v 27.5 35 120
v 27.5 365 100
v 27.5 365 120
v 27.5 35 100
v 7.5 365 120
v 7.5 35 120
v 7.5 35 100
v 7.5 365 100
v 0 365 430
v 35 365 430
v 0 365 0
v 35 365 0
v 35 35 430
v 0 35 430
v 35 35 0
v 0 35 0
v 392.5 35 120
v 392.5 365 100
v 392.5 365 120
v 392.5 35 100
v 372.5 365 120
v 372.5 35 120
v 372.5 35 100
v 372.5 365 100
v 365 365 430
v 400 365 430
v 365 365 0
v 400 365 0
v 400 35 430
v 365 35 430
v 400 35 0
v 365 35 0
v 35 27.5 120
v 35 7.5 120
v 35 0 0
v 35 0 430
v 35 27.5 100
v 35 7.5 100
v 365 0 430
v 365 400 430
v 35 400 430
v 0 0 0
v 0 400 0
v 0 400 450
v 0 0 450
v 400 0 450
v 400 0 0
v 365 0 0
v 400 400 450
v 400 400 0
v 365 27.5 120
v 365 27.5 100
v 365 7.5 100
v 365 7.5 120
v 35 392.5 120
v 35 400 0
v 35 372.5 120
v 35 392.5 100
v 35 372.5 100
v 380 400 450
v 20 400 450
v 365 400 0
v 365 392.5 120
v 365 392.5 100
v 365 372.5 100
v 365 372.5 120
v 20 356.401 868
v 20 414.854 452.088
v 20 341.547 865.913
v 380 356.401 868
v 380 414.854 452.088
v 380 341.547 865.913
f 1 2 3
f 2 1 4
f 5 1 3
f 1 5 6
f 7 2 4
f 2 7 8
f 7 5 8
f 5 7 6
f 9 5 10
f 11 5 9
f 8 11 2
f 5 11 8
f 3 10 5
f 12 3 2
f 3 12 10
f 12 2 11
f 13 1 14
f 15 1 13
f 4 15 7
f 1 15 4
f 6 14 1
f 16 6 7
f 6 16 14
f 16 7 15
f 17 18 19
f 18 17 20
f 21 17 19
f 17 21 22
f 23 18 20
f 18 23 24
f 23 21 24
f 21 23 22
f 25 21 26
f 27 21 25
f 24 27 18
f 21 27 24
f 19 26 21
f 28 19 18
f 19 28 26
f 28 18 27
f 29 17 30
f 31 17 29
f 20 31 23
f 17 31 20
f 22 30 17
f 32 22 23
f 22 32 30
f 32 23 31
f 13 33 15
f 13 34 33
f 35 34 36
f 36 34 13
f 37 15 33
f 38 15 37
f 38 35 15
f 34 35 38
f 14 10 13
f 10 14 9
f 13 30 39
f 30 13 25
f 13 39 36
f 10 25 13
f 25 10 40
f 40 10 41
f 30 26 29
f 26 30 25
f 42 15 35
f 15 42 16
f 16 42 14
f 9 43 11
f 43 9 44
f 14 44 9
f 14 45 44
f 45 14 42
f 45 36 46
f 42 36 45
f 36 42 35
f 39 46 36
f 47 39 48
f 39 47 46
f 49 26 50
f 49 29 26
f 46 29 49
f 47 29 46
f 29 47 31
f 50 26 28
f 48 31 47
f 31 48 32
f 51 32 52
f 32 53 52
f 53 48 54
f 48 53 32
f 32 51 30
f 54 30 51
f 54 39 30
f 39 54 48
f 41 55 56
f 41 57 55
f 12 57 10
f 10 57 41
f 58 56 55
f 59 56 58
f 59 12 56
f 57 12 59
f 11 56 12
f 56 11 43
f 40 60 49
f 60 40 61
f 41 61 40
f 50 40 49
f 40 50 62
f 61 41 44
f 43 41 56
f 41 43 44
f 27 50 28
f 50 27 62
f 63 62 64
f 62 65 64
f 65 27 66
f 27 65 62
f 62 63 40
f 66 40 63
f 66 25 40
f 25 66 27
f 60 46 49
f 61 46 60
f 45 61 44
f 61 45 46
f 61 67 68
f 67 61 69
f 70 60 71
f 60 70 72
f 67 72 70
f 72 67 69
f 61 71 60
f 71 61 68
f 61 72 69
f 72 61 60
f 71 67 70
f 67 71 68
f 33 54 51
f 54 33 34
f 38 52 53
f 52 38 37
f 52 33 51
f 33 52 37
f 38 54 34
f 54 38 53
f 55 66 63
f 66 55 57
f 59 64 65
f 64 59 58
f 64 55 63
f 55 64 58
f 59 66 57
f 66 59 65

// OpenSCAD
// Basic IKEA-style Chair in OpenSCAD
// All dimensions are in millimeters.

// --- Chair Configuration ---
seat_w = 400; // Width of the seat (X-axis)
seat_d = 400; // Depth of the seat (Y-axis)
seat_top_h = 450; // Height from floor to top of seat surface

backrest_h_above_seat = 420; // Height of backrest extending above the seat
backrest_w_ratio = 0.90; // Width of backrest relative to seat width
backrest_tilt_angle = 8; // Tilt angle of the backrest from vertical (positive tilts back)

// --- Material Thicknesses & Component Sizes ---
seat_thickness = 20;
backrest_thickness = 15;
leg_side = 35; // Square legs, side length
strut_side = 20; // Square struts, side length

// --- Derived Dimensions ---
actual_leg_h = seat_top_h - seat_thickness;
actual_backrest_w = seat_w * backrest_w_ratio;

// --- Strut Placement ---
// Z height of the *bottom* surface of the struts from the floor
strut_level_z = 100; 

$fn = 50; // Smoothness for any curves (though not explicitly used for cubes)

// --- Modules for Chair Parts ---

module leg() {
    cube([leg_side, leg_side, actual_leg_h]);
}

module seat_panel() {
    cube([seat_w, seat_d, seat_thickness]);
}

module backrest_panel() {
    // Centered for easier rotation placement later
    // Dimensions: X=width, Y=thickness, Z=height
    cube([actual_backrest_w, backrest_thickness, backrest_h_above_seat], center=true);
}

module strut_along_x(length) {
    // Strut oriented along the X-axis
    cube([length, strut_side, strut_side]);
}

module strut_along_y(length) {
    // Strut oriented along the Y-axis
    cube([strut_side, length, strut_side]);
}

// --- Assemble the Chair ---
// The chair's front-left-bottom corner (of front-left leg) is at origin [0,0,0]

union() {
    // --- Legs ---
    // Front-Left Leg
    translate([0, 0, 0]) 
        leg();
        
    // Front-Right Leg
    translate([seat_w - leg_side, 0, 0]) 
        leg();
        
    // Back-Left Leg
    translate([0, seat_d - leg_side, 0]) 
        leg();
        
    // Back-Right Leg
    translate([seat_w - leg_side, seat_d - leg_side, 0]) 
        leg();

    // --- Seat ---
    // Positioned on top of the legs. Its bottom surface is at Z = actual_leg_h.
    translate([0, 0, actual_leg_h]) 
        seat_panel();

    // --- Backrest ---
    // Pivot point for the backrest: center of the seat's back edge, on its top surface.
    backrest_pivot_x = seat_w / 2;
    backrest_pivot_y = seat_d; // At the very back edge of the seat panel
    backrest_pivot_z = seat_top_h; // At the top surface of the seat panel

    translate([backrest_pivot_x, backrest_pivot_y, backrest_pivot_z]) {
        rotate([backrest_tilt_angle, 0, 0]) { // Rotate around X-axis (tilts in Y-Z plane)
            // The backrest_panel module is already centered.
            // We need to shift it so its conceptual "front-bottom-center" aligns with the pivot.
            // Shift its center by half its thickness in Y and half its height in Z.
            translate([0, backrest_thickness / 2, backrest_h_above_seat / 2]) {
                backrest_panel();
            }
        }
    }

    // --- Struts (Support Beams) ---
    // Struts are placed between the inner faces of the legs.
    
    // Front Strut (runs along X-axis, under the front of the seat)
    front_strut_len = seat_w - 2 * leg_side;
    if (front_strut_len > 0) {
        translate([
            leg_side, // Start at inner face of left leg
            (leg_side - strut_side) / 2, // Center strut in depth of front leg
            strut_level_z // Z position from floor
        ])
            strut_along_x(front_strut_len);
    }

    // Back Strut (runs along X-axis, under the back of the seat)
    back_strut_len = seat_w - 2 * leg_side; // Same length as front strut
    if (back_strut_len > 0) {
        translate([
            leg_side, // Start at inner face of left leg
            seat_d - leg_side + (leg_side - strut_side) / 2, // Y pos: Center strut in depth of back leg
            strut_level_z // Z position from floor
        ])
            strut_along_x(back_strut_len);
    }

    // Side Struts (run along Y-axis)
    side_strut_len = seat_d - 2 * leg_side;
    if (side_strut_len > 0) {
        // Left Side Strut
        translate([
            (leg_side - strut_side) / 2, // X pos: Center strut in width of left leg
            leg_side, // Start at inner face of front leg (or back face of front leg)
            strut_level_z // Z position from floor
        ])
            strut_along_y(side_strut_len);

        // Right Side Strut
        translate([
            seat_w - leg_side + (leg_side - strut_side) / 2, // X pos: Center strut in width of right leg
            leg_side, // Start at inner face of front leg
            strut_level_z // Z position from floor
        ])
            strut_along_y(side_strut_len);
    }
}

// Example of how to view it slightly rotated:
// translate([0, -seat_d/2, 0]) rotate([0,0,30]) rotate([30,0,0]) chair(); 
// (if you wrap the union() in a module chair())
